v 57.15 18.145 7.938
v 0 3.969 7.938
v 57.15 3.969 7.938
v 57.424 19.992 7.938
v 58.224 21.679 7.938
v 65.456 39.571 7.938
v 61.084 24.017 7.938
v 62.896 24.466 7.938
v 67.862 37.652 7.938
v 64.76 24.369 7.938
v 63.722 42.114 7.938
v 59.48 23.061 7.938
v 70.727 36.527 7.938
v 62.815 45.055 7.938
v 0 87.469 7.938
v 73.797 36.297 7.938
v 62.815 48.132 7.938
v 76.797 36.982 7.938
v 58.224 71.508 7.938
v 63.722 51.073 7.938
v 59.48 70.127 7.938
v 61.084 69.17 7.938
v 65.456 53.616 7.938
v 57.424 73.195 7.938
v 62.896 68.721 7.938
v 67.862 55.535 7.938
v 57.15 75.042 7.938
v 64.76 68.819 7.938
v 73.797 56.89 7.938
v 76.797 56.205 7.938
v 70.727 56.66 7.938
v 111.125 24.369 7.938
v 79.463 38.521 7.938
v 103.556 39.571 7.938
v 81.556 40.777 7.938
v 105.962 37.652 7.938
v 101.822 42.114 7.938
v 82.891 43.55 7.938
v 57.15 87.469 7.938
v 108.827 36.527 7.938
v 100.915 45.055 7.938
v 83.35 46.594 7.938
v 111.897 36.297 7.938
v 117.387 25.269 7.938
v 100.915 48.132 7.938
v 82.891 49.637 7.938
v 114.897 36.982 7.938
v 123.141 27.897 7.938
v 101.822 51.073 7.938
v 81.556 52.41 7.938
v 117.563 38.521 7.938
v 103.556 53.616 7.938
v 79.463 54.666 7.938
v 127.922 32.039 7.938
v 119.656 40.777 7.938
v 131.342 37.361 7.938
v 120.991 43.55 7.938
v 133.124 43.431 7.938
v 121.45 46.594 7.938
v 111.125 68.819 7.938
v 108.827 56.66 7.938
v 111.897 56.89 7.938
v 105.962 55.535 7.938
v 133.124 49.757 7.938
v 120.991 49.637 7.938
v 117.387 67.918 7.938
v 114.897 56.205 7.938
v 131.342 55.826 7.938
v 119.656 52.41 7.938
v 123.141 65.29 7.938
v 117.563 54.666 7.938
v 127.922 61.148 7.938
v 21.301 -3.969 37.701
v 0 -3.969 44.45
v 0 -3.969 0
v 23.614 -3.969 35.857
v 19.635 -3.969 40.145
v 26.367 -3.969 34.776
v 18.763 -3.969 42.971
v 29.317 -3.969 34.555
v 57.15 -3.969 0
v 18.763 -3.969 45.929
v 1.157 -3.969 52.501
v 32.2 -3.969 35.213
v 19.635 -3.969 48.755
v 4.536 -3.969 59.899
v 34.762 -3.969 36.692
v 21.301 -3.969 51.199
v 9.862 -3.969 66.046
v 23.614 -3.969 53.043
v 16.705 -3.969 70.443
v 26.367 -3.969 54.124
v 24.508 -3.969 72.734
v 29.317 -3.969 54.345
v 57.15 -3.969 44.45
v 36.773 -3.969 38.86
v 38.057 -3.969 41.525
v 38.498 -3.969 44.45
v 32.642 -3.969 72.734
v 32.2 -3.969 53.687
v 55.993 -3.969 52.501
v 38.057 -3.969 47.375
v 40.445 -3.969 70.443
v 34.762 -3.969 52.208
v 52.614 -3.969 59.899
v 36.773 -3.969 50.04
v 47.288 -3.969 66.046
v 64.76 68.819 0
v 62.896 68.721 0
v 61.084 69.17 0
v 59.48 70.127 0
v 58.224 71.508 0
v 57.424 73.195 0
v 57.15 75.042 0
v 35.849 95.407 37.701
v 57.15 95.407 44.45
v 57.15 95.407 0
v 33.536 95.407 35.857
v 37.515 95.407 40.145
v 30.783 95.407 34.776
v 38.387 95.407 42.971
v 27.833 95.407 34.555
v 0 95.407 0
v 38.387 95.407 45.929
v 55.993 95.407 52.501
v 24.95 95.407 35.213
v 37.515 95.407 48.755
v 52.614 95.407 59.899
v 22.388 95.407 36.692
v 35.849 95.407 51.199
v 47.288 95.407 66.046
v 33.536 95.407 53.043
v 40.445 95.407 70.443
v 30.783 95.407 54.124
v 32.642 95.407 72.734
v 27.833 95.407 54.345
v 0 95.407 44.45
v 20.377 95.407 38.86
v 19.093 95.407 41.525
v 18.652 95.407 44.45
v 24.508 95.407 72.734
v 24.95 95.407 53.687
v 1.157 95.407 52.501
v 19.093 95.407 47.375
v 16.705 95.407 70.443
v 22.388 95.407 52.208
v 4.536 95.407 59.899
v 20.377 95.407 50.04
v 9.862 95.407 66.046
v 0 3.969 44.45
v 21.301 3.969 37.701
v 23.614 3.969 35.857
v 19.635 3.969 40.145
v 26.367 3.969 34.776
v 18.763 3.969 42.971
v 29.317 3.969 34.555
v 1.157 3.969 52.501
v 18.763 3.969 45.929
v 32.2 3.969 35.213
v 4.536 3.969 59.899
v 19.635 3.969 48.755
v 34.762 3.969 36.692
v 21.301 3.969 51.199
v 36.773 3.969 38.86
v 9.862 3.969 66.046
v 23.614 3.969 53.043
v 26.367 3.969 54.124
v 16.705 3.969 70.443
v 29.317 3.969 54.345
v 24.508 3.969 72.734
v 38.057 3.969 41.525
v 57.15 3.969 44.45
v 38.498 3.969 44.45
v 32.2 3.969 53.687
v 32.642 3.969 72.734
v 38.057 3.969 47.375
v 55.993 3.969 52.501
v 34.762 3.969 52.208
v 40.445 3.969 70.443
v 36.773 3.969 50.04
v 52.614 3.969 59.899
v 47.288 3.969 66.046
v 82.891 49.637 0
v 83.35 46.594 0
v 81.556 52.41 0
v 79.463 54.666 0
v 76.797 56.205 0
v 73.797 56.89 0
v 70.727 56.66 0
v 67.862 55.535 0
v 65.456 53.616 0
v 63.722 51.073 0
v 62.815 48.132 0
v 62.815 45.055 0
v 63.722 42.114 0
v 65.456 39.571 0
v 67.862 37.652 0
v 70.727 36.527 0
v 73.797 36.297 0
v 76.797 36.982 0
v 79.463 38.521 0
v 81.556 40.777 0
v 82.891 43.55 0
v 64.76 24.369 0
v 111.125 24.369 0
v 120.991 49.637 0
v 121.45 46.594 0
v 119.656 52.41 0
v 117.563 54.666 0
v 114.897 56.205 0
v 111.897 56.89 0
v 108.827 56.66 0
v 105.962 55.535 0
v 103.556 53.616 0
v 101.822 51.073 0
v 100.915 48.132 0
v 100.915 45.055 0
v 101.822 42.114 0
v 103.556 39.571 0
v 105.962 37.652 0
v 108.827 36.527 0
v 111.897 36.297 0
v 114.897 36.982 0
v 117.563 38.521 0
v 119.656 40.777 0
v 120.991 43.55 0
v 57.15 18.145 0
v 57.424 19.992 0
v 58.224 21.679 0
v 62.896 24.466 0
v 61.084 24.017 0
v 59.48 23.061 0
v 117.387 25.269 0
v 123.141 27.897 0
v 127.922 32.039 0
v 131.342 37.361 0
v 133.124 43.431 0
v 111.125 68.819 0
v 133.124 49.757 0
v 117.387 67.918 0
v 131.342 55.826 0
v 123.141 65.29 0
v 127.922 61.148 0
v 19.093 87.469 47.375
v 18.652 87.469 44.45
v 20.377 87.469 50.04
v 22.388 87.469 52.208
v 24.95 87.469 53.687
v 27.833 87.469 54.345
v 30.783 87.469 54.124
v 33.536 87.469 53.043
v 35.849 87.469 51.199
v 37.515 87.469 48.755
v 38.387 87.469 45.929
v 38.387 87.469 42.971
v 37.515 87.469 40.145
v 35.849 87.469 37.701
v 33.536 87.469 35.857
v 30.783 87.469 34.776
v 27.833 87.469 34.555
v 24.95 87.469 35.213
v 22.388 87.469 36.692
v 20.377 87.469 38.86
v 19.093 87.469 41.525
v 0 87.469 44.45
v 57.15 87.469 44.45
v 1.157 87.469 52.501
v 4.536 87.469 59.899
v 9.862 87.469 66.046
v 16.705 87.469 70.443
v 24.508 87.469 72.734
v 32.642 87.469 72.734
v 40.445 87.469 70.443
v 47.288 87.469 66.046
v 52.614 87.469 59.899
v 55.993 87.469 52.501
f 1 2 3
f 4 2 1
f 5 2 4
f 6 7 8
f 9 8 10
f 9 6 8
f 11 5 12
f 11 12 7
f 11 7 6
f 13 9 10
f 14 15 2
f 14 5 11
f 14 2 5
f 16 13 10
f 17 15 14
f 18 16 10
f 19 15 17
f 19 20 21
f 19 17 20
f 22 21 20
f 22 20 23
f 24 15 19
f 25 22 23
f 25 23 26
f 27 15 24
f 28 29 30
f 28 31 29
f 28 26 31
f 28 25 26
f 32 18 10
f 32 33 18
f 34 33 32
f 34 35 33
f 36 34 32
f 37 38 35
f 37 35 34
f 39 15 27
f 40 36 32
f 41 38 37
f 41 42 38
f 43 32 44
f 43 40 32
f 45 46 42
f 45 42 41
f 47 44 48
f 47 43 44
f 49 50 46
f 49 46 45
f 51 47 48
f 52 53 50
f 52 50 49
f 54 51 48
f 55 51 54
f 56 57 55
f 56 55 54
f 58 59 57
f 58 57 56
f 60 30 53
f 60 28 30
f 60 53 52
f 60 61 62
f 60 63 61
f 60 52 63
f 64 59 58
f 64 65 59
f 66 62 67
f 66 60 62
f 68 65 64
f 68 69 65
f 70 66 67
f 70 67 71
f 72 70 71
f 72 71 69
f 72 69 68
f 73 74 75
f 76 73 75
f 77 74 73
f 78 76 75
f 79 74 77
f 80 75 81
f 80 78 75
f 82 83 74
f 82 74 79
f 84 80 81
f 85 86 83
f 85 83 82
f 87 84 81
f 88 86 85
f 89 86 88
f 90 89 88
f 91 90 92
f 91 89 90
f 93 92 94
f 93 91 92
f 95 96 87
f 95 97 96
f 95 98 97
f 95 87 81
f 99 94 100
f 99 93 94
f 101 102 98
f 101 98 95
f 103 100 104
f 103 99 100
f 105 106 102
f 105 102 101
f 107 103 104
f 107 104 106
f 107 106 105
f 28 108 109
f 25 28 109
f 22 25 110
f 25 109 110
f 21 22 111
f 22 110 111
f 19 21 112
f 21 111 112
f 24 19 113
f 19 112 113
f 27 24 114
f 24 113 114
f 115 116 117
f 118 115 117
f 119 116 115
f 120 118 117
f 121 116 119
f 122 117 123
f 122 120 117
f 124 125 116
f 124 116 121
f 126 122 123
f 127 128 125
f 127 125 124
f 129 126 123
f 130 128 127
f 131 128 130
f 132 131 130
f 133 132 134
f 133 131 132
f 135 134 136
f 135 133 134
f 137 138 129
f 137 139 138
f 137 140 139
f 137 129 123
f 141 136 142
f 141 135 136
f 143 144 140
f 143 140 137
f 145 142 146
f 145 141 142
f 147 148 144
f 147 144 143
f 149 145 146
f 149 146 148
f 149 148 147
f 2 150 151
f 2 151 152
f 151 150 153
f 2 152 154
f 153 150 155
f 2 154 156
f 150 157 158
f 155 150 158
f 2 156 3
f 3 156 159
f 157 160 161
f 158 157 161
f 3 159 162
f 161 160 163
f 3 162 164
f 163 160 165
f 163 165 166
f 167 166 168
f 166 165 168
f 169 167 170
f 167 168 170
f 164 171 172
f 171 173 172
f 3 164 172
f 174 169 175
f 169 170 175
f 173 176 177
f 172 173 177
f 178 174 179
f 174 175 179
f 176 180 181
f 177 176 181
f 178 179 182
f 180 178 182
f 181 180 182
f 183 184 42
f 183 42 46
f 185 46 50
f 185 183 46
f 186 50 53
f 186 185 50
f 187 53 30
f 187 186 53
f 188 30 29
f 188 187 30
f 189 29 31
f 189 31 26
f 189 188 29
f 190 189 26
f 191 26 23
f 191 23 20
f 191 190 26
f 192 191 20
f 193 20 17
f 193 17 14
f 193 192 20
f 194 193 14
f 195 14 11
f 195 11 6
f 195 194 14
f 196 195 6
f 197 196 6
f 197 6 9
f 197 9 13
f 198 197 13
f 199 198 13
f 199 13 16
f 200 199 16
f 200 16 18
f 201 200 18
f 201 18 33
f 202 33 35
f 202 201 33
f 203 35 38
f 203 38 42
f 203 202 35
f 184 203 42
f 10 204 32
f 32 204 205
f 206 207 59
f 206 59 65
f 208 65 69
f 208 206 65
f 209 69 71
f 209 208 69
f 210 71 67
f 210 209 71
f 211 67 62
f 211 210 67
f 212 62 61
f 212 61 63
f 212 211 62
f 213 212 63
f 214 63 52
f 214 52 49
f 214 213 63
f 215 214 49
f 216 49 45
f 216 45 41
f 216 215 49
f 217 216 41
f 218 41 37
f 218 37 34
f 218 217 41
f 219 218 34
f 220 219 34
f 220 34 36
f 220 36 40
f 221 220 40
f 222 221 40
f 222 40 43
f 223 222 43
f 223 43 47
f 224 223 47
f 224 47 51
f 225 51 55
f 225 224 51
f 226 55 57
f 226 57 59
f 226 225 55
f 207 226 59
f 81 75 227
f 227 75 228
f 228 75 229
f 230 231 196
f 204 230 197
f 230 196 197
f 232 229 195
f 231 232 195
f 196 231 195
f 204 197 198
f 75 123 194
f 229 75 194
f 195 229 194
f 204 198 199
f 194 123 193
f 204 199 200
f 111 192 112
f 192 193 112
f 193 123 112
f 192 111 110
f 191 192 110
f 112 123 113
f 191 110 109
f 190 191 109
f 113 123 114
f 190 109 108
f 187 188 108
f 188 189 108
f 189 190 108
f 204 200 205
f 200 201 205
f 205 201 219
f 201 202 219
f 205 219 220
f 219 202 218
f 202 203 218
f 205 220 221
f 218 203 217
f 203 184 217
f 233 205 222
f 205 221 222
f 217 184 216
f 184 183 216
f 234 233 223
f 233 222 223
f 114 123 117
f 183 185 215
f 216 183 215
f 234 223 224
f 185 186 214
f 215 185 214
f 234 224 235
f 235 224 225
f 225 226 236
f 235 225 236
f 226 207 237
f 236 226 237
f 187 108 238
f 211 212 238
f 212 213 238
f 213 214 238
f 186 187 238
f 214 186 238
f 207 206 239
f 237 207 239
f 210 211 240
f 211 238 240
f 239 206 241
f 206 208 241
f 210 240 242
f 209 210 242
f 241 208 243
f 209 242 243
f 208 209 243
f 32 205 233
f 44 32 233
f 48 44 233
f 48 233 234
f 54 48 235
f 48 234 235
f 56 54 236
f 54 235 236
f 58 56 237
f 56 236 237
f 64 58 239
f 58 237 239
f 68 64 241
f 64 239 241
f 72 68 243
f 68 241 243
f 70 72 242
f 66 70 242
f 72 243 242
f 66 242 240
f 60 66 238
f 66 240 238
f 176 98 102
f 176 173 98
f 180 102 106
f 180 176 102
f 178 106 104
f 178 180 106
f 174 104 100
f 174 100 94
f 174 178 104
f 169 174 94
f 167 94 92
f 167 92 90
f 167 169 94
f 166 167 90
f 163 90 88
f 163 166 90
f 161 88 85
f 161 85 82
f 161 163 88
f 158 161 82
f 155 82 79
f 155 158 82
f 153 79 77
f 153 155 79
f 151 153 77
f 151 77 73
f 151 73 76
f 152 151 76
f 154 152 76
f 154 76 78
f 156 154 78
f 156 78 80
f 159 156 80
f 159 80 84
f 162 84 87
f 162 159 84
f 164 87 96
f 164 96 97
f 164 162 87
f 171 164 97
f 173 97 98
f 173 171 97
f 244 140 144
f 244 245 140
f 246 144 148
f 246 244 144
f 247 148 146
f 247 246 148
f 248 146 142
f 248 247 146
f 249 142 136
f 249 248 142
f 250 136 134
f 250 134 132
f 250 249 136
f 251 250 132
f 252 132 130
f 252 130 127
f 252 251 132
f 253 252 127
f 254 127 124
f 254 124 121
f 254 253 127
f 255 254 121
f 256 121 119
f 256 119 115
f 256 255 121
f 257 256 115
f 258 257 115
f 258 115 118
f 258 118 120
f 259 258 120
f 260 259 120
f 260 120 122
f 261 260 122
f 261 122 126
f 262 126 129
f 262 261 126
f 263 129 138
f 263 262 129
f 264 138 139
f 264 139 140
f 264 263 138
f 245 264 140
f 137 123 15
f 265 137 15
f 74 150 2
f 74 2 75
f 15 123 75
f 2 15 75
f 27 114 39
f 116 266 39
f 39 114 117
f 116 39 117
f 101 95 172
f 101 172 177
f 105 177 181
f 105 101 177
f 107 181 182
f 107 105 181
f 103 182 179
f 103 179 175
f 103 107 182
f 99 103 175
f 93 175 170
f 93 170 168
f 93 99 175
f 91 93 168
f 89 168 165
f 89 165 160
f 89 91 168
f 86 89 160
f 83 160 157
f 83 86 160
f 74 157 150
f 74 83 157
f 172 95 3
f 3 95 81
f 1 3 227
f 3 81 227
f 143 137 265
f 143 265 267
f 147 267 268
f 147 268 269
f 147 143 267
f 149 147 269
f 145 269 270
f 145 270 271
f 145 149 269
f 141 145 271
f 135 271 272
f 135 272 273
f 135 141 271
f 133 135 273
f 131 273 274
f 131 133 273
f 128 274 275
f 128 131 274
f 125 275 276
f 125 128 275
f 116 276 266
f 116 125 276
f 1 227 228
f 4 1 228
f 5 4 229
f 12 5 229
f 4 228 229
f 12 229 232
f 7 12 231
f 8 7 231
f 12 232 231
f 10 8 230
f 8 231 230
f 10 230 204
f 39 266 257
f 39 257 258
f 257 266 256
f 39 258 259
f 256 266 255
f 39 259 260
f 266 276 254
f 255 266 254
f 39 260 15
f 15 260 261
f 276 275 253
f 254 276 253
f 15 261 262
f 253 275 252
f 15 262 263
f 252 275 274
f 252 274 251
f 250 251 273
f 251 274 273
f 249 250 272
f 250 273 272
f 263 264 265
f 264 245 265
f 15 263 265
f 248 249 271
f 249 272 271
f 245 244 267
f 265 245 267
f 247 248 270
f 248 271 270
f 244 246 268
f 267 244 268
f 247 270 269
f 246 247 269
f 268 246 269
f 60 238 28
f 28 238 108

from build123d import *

# Parameters (mm, degrees)
F0_W     = 57.15
F0_H     = 18.1449148804
F0_R     = 10.3251
F0_H_2   = 16.3959403712
F1_DEPTH = 7.9375
F2_W     = 57.15
F2_H     = 7.9375
F2_R     = 9.92251
F3_DEPTH = 3.96875
F4_W     = 57.15
F4_H     = 7.9375
F4_R     = 9.92251
F5_DEPTH = 3.96875


with BuildPart() as f1:
    # F0 (on Top) → F1 (new body)
    with BuildSketch(Plane.XY):
        with Locations((28.575, 9.0724574402)):
            Rectangle(F0_W, F0_H)
        with BuildLine():
            Line((0, 75.0422115248), (0, 18.1449148804))
            Line((0, 18.1449148804), (57.15, 18.1449148804))
            ThreePointArc((57.15, 18.1449148804), (59.4801290617, 23.0605163329), (64.7604370519, 24.3685632026))
            Line((64.7604370519, 24.3685632026), (111.125, 24.3685632026))
            ThreePointArc((111.125, 24.3685632026), (133.35, 46.5935632026), (111.125, 68.8185632026))
            Line((111.125, 68.8185632026), (64.7604370519, 68.8185632026))
            ThreePointArc((64.7604370519, 68.8185632026), (59.4801290617, 70.1266100723), (57.15, 75.0422115248))
            Line((57.15, 75.0422115248), (0, 75.0422115248))
        make_face()
        with Locations((73.025, 46.5935632026)):
            Circle(F0_R, mode=Mode.SUBTRACT)
        with Locations((111.125, 46.5935632026)):
            Circle(F0_R, mode=Mode.SUBTRACT)
        with Locations((28.575, 83.2401817104)):
            Rectangle(F0_W, F0_H_2)
    extrude(amount=F1_DEPTH)

    # F2 (on face) → F3 (join, symmetric)
    with BuildSketch(Plane.XZ):
        with Locations((28.575, 3.96875)):
            Rectangle(F2_W, F2_H)
        with BuildLine():
            Line((0, 44.45), (0, 7.9375))
            Line((0, 7.9375), (57.15, 7.9375))
            Line((57.15, 7.9375), (57.15, 44.45))
            ThreePointArc((57.15, 44.45), (28.575, 73.025), (0, 44.45))
        make_face()
        with Locations((28.575, 44.45)):
            Circle(F2_R, mode=Mode.SUBTRACT)
    extrude(amount=F3_DEPTH, both=True)

    # F4 (on face) → F5 (join, symmetric)
    with BuildSketch(Plane(origin=(0, 91.438151896, 0), x_dir=(-1, 0, 0), z_dir=(0, 1, 0))):
        with Locations((-28.575, 3.96875)):
            Rectangle(F4_W, F4_H)
        with BuildLine():
            Line((-57.15, 44.45), (-57.15, 7.9375))
            Line((-57.15, 7.9375), (0, 7.9375))
            Line((0, 7.9375), (0, 44.45))
            ThreePointArc((0, 44.45), (-28.575, 73.025), (-57.15, 44.45))
        make_face()
        with Locations((-28.575, 44.45)):
            Circle(F4_R, mode=Mode.SUBTRACT)
    extrude(amount=F5_DEPTH, both=True)


solid = f1.part
